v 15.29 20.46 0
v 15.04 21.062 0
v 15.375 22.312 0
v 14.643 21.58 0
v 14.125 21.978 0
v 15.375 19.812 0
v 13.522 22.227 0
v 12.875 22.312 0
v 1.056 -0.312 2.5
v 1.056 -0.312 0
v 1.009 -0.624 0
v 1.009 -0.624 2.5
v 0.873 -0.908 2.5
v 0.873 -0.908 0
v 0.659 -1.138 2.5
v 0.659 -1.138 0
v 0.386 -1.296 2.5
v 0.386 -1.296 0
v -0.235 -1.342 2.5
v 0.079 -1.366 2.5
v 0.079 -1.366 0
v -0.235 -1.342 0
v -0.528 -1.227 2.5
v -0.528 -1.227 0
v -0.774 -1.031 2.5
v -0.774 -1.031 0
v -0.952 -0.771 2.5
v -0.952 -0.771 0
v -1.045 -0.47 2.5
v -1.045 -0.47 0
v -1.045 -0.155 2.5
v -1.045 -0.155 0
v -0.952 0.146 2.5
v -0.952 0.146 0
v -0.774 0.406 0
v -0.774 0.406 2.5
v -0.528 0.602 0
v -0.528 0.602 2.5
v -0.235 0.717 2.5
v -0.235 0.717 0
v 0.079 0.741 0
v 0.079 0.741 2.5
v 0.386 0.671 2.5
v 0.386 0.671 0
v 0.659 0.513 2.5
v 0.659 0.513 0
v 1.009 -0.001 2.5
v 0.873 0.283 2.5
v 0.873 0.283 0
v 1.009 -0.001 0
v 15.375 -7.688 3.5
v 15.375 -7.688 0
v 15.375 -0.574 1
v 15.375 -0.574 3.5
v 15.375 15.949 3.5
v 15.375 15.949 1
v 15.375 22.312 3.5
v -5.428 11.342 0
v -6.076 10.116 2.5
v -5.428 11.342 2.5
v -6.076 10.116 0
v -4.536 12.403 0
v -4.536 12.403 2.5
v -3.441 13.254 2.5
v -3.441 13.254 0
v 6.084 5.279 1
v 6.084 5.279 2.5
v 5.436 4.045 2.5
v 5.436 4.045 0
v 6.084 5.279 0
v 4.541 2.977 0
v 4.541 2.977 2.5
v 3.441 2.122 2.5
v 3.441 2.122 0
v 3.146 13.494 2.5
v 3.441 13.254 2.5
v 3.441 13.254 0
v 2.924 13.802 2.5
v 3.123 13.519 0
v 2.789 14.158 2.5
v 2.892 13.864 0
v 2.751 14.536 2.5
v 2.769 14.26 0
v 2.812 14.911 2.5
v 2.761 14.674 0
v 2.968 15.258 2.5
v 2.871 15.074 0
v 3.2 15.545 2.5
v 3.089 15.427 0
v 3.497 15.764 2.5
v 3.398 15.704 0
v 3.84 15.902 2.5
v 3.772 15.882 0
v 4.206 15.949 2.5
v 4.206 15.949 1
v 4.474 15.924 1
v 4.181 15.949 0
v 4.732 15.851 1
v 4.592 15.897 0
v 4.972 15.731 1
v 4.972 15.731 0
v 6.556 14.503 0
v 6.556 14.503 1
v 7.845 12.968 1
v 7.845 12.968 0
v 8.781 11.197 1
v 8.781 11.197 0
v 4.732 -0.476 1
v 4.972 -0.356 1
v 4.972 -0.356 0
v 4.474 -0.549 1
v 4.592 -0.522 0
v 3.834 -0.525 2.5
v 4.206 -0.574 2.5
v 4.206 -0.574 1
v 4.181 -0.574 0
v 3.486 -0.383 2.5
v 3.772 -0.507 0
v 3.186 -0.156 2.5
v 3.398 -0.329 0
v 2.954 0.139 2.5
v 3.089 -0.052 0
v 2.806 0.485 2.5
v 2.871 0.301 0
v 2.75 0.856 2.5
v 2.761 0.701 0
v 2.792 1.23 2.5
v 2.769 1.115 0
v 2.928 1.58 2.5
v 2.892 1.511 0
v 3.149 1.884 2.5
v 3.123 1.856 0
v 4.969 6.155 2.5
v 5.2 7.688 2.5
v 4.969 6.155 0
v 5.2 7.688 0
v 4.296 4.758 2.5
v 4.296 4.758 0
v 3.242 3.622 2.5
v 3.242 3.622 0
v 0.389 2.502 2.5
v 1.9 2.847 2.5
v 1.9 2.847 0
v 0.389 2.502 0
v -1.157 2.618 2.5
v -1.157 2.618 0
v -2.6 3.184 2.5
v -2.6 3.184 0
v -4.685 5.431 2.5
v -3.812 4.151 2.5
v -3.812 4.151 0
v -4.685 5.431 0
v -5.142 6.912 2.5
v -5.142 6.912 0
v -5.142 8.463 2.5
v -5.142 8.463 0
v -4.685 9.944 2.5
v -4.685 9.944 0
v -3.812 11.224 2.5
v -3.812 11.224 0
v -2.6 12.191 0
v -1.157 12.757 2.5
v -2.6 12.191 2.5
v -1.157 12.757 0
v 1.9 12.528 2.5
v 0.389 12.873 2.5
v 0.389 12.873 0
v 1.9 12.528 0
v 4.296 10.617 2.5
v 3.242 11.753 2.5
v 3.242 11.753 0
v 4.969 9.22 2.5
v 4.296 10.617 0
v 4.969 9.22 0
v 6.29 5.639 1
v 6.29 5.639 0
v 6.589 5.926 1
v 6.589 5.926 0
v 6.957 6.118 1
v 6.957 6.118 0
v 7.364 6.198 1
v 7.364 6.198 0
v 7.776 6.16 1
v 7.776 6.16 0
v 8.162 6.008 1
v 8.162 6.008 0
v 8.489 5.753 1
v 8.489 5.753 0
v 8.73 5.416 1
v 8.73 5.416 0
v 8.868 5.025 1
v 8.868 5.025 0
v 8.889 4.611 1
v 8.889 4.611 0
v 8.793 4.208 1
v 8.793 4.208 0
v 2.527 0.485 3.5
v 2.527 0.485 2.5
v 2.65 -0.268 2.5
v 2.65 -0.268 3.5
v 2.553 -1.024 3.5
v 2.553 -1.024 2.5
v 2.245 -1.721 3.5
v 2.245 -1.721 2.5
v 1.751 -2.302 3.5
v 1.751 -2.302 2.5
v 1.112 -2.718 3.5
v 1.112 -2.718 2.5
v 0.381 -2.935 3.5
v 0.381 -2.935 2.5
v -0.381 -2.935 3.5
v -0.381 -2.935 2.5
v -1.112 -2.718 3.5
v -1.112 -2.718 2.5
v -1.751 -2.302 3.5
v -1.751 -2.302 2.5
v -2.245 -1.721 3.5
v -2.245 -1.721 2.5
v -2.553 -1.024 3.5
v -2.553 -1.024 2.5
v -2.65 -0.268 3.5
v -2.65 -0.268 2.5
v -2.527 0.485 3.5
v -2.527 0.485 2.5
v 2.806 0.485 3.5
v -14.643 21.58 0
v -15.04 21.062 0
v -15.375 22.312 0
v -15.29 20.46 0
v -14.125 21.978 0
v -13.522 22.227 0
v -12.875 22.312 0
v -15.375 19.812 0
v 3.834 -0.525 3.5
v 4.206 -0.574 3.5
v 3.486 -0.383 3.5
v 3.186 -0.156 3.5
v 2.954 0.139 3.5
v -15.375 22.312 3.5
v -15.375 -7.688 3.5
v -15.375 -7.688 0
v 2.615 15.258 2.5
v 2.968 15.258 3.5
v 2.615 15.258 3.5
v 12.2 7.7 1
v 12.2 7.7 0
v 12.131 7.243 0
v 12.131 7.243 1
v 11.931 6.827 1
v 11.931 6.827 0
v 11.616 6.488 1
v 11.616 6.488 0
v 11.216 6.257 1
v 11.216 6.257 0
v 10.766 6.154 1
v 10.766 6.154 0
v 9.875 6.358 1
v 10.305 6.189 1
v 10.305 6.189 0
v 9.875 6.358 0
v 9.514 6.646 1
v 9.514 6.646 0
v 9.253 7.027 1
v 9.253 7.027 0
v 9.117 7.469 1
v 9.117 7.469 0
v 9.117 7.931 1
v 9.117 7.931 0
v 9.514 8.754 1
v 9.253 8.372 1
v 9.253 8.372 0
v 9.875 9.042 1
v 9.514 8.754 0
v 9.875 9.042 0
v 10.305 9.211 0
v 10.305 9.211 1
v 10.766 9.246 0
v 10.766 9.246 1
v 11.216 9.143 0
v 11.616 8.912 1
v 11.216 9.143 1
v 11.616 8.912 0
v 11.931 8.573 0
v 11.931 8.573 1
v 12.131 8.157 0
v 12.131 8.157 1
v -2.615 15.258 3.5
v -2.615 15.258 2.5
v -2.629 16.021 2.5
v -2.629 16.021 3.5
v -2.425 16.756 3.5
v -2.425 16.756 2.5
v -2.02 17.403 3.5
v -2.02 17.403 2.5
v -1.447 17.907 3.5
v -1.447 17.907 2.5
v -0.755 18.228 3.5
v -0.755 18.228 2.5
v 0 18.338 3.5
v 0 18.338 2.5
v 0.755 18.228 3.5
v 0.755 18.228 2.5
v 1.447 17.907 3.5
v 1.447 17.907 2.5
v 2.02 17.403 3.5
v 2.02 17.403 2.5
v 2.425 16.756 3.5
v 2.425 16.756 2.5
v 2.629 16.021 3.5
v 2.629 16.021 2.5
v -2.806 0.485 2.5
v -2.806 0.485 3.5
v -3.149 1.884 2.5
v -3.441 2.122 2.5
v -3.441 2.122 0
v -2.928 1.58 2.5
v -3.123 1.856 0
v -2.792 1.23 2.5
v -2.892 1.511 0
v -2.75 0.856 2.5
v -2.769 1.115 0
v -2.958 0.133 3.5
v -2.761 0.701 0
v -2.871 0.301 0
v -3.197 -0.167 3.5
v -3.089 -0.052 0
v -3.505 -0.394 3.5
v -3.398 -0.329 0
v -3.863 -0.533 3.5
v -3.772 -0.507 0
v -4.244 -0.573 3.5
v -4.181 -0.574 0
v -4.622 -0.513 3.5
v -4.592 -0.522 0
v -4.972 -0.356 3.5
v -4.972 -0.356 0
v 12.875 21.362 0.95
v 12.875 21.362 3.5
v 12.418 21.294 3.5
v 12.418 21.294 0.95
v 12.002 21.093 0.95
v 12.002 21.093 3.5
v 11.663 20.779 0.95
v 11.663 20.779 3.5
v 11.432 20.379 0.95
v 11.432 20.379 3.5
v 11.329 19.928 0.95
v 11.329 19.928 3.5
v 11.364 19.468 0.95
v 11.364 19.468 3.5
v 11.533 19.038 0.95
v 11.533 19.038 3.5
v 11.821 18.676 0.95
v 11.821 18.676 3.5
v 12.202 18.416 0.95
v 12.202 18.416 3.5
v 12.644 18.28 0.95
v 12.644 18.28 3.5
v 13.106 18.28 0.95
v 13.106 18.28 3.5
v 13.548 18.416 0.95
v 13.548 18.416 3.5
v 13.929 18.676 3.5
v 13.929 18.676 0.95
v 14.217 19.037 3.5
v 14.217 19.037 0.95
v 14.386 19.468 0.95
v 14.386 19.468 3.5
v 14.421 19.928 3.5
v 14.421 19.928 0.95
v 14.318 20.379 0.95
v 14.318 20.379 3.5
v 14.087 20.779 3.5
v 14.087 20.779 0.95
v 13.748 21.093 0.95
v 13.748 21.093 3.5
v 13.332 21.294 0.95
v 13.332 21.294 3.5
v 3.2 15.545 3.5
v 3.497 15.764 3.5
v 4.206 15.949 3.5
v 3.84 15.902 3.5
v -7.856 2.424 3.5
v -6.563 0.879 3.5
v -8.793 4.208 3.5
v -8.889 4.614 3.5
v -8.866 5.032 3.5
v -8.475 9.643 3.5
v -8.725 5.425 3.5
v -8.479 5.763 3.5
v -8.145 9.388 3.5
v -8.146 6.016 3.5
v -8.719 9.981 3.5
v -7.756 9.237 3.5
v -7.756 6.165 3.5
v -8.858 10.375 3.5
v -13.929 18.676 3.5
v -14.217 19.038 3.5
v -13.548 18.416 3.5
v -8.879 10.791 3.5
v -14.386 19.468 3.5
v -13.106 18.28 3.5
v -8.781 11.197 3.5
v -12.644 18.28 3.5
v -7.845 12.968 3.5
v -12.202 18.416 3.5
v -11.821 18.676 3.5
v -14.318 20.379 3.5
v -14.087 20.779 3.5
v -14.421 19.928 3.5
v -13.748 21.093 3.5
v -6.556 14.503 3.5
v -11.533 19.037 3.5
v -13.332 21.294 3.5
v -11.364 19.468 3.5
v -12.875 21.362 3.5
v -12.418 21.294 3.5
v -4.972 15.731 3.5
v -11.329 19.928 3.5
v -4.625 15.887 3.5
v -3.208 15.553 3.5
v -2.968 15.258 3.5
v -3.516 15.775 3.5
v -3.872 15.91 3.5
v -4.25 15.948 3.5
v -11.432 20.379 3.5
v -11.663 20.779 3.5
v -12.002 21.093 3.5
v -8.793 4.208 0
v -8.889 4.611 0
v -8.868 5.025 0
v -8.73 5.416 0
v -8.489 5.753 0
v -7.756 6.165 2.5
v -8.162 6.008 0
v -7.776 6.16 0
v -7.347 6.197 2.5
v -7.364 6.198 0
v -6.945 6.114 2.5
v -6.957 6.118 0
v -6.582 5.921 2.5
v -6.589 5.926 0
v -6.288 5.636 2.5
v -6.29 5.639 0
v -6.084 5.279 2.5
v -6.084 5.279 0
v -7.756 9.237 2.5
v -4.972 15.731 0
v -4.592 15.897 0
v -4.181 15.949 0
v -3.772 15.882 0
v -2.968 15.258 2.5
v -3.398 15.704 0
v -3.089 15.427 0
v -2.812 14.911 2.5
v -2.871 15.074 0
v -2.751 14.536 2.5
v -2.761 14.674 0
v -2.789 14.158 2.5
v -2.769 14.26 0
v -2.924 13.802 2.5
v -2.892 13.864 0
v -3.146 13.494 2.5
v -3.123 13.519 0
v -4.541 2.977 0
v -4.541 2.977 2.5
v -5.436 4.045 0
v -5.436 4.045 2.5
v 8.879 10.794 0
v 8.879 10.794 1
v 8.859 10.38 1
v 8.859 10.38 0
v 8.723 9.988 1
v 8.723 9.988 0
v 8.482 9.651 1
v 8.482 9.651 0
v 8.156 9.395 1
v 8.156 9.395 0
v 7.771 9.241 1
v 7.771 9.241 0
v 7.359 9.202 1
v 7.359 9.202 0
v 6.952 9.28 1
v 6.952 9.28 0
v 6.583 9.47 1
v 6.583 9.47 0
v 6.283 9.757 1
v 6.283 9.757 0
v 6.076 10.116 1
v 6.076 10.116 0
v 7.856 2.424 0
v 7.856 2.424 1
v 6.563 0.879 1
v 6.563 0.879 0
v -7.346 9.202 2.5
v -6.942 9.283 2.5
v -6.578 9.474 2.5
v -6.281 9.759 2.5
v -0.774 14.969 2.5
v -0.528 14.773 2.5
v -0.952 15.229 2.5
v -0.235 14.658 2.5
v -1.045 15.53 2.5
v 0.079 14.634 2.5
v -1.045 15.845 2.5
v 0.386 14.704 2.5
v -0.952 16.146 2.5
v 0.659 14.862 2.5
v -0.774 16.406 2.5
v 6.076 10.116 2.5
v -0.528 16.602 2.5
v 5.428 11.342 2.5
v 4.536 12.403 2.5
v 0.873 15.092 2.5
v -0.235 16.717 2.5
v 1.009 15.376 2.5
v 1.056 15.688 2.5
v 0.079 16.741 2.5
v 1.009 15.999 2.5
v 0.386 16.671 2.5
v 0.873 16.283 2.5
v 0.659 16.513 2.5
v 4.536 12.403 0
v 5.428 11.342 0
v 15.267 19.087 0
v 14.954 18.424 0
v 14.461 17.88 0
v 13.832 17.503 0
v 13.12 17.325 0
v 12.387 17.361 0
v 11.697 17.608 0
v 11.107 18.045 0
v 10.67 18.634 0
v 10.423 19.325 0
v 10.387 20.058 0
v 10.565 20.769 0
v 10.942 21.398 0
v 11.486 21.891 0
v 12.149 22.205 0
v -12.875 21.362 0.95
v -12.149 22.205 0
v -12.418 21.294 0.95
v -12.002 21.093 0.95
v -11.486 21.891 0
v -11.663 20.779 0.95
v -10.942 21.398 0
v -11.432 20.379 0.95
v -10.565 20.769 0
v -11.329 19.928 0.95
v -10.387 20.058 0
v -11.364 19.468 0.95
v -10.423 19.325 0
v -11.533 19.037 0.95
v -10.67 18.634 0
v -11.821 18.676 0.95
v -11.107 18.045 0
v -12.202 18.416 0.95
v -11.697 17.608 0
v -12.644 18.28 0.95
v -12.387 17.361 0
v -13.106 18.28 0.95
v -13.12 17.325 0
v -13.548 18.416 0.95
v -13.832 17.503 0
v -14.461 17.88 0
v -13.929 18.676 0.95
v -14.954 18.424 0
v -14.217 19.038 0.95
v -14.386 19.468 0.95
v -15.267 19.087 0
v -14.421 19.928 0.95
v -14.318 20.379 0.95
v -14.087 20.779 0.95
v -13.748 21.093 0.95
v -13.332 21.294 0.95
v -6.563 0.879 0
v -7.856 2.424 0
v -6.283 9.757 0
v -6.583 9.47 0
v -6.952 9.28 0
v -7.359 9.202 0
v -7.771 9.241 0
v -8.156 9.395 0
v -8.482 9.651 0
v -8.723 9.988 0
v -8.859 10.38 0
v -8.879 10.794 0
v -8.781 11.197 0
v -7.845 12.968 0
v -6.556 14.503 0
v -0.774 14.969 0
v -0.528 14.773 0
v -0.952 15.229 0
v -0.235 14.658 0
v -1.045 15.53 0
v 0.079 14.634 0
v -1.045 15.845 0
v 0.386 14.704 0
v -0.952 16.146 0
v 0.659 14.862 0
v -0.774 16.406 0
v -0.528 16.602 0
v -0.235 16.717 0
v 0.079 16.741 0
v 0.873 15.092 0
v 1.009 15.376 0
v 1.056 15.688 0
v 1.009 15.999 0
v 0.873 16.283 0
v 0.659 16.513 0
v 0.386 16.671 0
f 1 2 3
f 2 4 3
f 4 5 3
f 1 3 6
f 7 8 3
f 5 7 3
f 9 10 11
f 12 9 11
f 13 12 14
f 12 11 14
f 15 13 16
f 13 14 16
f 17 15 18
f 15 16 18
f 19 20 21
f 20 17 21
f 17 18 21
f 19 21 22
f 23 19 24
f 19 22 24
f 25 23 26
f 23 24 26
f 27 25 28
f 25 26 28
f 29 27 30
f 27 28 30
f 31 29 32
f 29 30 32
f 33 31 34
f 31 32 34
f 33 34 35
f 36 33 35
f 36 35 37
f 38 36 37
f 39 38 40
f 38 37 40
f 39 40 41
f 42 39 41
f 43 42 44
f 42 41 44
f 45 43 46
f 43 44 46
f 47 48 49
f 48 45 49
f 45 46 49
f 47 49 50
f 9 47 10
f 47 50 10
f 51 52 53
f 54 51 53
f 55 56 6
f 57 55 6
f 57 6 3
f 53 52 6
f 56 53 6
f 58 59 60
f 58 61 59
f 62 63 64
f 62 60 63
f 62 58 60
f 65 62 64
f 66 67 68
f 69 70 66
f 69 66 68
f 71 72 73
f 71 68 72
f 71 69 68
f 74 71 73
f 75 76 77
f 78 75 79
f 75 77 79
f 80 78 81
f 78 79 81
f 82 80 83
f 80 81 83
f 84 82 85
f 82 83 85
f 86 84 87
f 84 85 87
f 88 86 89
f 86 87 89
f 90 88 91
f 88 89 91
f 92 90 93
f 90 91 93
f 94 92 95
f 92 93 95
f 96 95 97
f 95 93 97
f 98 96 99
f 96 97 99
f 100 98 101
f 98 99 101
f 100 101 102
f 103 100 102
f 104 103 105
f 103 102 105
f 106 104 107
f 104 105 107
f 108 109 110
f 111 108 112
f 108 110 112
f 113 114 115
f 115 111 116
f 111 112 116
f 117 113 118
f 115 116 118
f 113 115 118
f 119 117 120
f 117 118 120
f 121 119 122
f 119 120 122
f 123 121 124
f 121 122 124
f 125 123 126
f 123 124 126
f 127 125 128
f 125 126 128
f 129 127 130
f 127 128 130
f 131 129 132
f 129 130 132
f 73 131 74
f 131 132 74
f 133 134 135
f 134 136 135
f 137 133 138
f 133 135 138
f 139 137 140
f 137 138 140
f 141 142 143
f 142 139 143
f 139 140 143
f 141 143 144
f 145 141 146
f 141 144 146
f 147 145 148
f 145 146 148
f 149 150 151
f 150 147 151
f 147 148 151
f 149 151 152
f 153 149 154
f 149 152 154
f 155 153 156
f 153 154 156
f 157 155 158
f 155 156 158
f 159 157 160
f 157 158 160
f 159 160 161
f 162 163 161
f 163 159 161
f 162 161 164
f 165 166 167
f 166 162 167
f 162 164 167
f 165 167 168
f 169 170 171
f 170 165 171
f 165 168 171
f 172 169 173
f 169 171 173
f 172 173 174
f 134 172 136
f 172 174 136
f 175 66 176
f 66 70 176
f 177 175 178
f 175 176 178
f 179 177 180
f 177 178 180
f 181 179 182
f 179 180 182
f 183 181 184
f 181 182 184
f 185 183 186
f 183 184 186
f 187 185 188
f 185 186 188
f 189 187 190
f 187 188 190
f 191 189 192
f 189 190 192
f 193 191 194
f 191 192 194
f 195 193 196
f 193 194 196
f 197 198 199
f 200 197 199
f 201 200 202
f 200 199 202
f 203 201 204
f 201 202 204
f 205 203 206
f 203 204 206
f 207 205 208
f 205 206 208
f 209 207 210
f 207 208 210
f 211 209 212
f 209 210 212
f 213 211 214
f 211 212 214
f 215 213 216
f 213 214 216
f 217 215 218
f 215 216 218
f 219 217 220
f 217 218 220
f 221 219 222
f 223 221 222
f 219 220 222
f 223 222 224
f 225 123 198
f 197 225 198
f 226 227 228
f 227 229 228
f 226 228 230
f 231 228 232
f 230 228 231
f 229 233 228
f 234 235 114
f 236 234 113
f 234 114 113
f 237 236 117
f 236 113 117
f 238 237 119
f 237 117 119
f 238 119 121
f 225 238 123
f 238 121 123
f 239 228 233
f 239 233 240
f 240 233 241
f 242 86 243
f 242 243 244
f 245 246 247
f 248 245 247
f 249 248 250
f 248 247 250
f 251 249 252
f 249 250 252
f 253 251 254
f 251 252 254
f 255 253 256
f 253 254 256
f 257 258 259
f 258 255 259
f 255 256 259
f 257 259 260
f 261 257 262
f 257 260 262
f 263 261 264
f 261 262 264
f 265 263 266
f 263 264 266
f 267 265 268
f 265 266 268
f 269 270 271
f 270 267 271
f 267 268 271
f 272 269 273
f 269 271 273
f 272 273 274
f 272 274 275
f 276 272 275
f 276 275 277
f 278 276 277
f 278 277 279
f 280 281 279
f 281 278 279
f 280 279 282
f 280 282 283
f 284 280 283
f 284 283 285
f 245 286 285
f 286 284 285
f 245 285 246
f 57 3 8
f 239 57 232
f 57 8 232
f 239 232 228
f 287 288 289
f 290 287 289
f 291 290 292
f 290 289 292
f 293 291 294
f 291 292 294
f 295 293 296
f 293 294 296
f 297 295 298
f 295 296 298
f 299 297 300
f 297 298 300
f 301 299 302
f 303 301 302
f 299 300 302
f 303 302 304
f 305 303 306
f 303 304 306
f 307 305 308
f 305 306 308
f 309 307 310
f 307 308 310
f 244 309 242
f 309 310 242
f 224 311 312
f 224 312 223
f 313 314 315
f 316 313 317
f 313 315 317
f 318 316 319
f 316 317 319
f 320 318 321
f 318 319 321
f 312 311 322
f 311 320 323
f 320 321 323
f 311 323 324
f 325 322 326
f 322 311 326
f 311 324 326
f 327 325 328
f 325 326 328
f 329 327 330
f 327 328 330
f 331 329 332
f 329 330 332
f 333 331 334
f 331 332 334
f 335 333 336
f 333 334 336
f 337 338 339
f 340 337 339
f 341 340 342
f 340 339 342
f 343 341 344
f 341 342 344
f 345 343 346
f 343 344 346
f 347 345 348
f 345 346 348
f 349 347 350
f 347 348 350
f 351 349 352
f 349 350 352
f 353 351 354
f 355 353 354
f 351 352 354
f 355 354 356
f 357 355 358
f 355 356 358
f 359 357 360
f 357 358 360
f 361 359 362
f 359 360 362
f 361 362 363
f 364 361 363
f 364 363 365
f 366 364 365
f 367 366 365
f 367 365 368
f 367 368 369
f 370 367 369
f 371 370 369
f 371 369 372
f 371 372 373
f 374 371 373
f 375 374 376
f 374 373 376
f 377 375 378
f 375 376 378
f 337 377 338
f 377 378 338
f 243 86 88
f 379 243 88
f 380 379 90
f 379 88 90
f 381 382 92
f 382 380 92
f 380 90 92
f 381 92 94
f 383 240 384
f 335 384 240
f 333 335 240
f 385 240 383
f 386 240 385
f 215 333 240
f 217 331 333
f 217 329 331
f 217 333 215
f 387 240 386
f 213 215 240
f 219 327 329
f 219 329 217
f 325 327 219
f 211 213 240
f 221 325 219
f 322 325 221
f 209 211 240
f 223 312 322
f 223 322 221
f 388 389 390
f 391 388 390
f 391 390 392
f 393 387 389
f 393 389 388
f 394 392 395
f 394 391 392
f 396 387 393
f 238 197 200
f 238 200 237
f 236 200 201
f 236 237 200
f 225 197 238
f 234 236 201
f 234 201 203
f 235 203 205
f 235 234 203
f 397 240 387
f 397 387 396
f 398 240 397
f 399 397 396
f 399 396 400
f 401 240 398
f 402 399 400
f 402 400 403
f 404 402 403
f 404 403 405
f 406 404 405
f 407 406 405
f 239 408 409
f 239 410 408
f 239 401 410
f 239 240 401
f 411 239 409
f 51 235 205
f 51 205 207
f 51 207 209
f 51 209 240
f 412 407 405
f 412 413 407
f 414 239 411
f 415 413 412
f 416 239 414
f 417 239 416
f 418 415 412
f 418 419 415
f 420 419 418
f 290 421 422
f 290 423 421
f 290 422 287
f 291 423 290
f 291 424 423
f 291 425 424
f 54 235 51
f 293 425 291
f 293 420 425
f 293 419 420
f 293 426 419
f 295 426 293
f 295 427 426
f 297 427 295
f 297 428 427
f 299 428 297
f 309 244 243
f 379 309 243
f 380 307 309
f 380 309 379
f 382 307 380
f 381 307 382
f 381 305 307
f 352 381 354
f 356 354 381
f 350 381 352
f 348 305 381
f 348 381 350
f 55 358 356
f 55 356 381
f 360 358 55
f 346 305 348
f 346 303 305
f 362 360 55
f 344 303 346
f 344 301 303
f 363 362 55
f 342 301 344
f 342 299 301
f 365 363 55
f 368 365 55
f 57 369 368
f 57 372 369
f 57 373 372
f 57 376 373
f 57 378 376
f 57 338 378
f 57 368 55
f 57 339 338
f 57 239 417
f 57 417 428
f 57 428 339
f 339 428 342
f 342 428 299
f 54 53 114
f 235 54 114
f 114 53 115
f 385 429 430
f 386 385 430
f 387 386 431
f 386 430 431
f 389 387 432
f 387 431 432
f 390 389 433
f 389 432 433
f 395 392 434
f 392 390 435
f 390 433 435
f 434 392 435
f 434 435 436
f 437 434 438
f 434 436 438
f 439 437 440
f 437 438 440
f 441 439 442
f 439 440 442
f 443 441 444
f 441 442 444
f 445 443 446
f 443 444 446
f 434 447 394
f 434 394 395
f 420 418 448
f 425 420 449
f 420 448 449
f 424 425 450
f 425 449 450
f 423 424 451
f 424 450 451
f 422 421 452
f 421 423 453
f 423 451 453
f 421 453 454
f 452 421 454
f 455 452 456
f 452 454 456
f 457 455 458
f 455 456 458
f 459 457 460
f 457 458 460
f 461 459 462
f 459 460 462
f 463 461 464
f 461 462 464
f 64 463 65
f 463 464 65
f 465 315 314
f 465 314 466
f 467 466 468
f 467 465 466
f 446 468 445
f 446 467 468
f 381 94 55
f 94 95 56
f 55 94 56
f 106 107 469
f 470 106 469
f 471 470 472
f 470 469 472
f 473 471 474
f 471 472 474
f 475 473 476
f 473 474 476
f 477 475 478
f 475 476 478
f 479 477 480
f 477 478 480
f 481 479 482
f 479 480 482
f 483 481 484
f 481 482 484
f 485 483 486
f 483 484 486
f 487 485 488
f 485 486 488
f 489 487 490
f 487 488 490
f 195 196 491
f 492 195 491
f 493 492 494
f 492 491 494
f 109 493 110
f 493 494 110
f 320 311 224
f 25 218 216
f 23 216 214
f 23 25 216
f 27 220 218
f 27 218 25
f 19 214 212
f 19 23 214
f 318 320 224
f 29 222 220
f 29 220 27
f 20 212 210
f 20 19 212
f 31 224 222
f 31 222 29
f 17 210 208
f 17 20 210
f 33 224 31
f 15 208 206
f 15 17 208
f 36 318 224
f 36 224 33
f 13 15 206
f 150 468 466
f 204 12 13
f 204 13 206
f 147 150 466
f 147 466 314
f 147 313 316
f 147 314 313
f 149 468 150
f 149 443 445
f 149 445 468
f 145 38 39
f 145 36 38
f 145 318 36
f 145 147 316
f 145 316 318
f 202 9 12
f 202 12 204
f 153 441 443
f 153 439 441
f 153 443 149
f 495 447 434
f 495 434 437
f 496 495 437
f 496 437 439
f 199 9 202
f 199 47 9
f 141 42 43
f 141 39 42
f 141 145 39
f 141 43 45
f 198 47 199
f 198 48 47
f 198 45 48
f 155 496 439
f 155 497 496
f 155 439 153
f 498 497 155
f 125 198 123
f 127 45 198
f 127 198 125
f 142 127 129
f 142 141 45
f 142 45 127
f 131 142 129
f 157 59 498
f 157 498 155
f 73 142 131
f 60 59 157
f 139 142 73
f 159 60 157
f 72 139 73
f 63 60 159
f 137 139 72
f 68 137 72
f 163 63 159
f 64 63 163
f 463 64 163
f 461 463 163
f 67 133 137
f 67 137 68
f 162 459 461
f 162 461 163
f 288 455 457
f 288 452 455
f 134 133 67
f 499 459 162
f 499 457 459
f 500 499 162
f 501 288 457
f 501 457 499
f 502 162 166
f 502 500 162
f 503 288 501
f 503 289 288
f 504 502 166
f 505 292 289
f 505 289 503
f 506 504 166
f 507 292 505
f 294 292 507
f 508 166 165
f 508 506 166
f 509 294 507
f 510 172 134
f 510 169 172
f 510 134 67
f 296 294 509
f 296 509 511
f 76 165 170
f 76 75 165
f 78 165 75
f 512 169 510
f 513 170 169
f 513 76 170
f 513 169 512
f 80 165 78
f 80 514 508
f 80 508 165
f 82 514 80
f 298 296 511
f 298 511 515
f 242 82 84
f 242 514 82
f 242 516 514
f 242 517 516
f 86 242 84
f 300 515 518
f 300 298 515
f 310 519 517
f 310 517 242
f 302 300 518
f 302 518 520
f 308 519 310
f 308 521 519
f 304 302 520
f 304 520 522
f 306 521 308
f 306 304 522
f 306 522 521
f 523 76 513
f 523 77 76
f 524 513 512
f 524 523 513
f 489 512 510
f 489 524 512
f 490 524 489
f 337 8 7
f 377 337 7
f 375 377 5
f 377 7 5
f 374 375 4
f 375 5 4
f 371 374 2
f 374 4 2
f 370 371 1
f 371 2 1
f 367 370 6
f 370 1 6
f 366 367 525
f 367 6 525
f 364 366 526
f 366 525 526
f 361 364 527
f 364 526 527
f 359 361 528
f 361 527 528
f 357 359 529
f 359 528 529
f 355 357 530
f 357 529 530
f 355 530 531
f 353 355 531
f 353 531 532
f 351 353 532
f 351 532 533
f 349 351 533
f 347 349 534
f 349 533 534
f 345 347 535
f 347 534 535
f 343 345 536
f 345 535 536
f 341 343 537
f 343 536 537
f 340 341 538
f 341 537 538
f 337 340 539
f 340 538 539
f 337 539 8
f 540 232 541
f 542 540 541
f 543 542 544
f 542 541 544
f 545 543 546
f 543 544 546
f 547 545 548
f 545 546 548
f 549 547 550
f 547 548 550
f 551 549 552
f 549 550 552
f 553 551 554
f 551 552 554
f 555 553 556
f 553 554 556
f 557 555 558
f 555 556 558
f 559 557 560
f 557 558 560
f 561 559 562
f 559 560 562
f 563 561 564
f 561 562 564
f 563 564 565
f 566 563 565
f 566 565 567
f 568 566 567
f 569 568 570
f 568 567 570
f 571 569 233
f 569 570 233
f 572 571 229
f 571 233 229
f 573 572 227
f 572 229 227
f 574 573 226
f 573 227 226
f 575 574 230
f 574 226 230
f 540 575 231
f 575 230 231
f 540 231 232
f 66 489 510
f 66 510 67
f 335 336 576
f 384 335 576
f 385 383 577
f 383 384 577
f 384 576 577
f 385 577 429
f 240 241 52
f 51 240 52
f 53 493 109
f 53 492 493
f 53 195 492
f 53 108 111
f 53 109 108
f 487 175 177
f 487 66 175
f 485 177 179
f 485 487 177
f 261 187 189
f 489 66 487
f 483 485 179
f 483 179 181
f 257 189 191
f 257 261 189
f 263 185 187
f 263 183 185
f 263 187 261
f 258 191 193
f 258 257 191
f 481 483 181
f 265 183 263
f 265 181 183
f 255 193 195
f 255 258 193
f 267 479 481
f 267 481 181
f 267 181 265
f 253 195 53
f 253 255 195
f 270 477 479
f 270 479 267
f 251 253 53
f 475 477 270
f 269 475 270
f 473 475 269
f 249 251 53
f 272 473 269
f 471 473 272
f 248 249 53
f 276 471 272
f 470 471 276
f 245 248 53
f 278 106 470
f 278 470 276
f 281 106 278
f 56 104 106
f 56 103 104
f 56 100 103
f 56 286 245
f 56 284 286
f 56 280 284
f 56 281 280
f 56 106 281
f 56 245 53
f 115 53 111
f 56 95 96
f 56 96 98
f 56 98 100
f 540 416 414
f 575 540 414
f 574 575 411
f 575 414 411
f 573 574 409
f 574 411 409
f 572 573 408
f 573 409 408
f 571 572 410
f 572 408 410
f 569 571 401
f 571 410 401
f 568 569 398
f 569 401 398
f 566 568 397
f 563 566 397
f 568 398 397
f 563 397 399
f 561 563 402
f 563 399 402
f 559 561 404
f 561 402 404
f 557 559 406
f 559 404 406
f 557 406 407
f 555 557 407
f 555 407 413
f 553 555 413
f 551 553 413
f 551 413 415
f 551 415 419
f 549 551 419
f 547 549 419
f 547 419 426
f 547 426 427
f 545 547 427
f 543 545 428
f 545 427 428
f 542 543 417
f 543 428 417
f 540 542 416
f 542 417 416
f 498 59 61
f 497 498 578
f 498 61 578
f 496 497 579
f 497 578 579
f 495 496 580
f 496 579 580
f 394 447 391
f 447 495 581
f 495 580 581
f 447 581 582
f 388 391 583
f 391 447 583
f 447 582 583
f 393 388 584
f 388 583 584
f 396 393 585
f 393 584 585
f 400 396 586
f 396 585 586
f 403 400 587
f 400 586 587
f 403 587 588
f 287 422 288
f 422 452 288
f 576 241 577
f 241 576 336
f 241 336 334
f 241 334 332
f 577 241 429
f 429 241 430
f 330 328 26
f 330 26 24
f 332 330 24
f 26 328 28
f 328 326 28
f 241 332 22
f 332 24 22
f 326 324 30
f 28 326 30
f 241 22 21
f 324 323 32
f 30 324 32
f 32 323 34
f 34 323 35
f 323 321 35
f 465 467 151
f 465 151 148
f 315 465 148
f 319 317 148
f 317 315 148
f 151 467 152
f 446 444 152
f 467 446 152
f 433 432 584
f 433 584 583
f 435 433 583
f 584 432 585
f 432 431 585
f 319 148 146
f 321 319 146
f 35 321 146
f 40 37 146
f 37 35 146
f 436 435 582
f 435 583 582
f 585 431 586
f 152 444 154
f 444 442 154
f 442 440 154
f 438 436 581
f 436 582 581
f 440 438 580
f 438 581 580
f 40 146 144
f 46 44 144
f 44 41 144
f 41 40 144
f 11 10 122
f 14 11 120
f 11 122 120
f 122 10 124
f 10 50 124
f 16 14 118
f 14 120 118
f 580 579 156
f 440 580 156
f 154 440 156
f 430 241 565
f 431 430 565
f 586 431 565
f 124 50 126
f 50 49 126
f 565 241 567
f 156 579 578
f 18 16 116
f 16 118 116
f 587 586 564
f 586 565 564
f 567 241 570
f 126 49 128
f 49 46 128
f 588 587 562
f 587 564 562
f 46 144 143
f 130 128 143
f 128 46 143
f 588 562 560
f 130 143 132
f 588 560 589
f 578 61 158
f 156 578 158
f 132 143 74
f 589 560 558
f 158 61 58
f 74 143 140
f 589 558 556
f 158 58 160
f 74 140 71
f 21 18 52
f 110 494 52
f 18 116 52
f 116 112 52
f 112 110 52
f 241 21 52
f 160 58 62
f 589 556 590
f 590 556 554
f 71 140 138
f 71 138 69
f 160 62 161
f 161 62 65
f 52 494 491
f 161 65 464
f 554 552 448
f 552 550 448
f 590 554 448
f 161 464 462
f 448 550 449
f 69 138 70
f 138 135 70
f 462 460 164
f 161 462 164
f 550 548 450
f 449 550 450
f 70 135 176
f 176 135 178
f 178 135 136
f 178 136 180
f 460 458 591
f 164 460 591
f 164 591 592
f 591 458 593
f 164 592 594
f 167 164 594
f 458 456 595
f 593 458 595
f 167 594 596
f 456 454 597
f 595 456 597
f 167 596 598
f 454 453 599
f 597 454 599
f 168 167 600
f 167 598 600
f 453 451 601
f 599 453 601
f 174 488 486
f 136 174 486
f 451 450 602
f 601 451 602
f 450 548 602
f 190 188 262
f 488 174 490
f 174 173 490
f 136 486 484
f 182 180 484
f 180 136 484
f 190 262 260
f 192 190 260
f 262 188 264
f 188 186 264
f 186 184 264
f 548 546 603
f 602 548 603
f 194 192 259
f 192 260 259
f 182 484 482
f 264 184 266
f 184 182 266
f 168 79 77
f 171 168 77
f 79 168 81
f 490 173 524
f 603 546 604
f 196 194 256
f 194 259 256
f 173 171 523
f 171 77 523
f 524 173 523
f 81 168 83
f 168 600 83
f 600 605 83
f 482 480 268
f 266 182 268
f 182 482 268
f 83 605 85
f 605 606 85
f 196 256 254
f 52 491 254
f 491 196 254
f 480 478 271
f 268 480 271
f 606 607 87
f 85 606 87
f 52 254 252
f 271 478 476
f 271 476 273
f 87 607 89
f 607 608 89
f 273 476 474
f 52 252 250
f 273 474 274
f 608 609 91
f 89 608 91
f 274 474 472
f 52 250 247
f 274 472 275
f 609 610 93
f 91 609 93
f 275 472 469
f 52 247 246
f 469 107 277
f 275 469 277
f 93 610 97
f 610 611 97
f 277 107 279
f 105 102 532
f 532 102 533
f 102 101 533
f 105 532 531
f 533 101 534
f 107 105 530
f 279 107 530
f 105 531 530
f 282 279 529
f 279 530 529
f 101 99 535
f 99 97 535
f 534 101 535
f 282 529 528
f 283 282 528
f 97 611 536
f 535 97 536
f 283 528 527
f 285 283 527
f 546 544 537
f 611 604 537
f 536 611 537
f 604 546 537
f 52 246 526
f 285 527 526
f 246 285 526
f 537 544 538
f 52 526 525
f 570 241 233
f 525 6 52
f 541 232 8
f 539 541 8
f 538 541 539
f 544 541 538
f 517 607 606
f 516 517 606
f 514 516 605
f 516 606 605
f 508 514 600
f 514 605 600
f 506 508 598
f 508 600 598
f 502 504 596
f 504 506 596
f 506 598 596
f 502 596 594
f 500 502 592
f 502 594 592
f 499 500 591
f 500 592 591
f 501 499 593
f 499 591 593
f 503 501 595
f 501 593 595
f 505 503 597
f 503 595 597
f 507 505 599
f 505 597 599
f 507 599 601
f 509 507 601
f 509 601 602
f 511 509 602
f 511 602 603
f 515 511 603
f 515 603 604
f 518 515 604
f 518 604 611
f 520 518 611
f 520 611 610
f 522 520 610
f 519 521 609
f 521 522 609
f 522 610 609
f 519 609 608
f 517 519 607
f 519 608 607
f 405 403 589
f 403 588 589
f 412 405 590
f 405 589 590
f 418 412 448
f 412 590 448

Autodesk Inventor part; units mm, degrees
ref_plane "YZ Plane" through (0, 0, 0) normal (1, 0, 0) x (0, 1, 0)
ref_plane "XZ Plane" through (0, 0, 0) normal (0, 1, 0) x (-1, 0, 0)
ref_plane "XY Plane" through (0, 0, 0) normal (0, 0, 1) x (1, 0, 0)
ref_plane "Work Plane1" through (0, 0, 0) normal (0, 0, 1) x (1, 0, 0)
sketch "Sketch1" plane through (0, 0, 0) normal (0, 0, 1) x (1, 0, 0)
  arc A0 (-3.651, 13.5937) -> (-4.7619, 15.391) centre (-4.2064, 14.4923) ccw projected
  arc A1 (-3.651, 13.5937) -> (-6.4477, 10.2643) centre (0, 7.6875) ccw projected
  arc A2 (-8.4097, 11.0483) -> (-6.4477, 10.2643) centre (-7.4287, 10.6563) ccw projected
  arc A3 (-4.7619, 15.391) -> (-8.4097, 11.0483) centre (0, 7.6875) ccw projected
  arc A4 (6.4477, 10.2643) -> (8.4097, 11.0483) centre (7.4287, 10.6563) ccw projected
  arc A5 (6.4477, 10.2643) -> (3.651, 13.5937) centre (0, 7.6875) ccw projected
  arc A6 (4.7619, 15.391) -> (3.651, 13.5937) centre (4.2064, 14.4923) ccw projected
  arc A7 (8.4097, 11.0483) -> (4.7619, 15.391) centre (0, 7.6875) ccw projected
  arc A8 (-6.4563, 5.1322) -> (-8.4209, 4.3547) centre (-7.4386, 4.7434) ccw projected
  arc A9 (-6.4563, 5.1322) -> (-3.651, 1.7813) centre (0, 7.6875) ccw projected
  arc A10 (-4.7619, -0.016) -> (-3.651, 1.7813) centre (-4.2064, 0.8827) ccw projected
  arc A11 (-8.4209, 4.3547) -> (-4.7619, -0.016) centre (0, 7.6875) ccw projected
  arc A12 (3.651, 1.7813) -> (4.7619, -0.016) centre (4.2064, 0.8827) ccw projected
  arc A13 (3.651, 1.7813) -> (6.4563, 5.1322) centre (0, 7.6875) ccw projected
  arc A14 (8.4209, 4.3547) -> (6.4563, 5.1322) centre (7.4386, 4.7434) ccw projected
  arc A15 (4.7619, -0.016) -> (8.4209, 4.3547) centre (0, 7.6875) ccw projected
  circle A16 centre (10.65, 7.6999) radius 1.15 projected
  circle A17 centre (0, 15.6875) radius 1.0564 projected
  circle A18 centre (0, -0.3125) radius 1.0564 projected
  circle A19 centre (0, 7.6875) radius 5 projected
  circle A20 centre (0, 7.6875) radius 13.7 projected
  line L0 (-116.625, -11.1875) -> (15.375, -11.1875) projected
  line L1 (15.375, -11.1875) -> (15.375, -7.6875) projected
  line L2 (-116.625, -7.6875) -> (15.375, -7.6875) projected
  line L3 (-116.625, -11.1875) -> (-116.625, -7.6875) projected
  line L4 (15.375, -7.6875) -> (-15.375, -7.6875)
  line L5 (-15.375, -7.6875) -> (-15.375, 22.3125)
  line L6 (-15.375, 22.3125) -> (15.375, 22.3125)
  line L7 (15.375, 22.3125) -> (15.375, -7.6875)
  circle A21 centre (0, 7.6875) radius 14.375 projected
  circle A22 centre (0, 7.6875) radius 5.2
  arc A23 (-3.4406, 13.2535) -> (-4.9722, 15.7312) centre (-4.2064, 14.4923) ccw
  arc A24 (-3.4406, 13.2535) -> (-6.0763, 10.1158) centre (0, 7.6875) ccw
  arc A25 (-8.7812, 11.1968) -> (-6.0763, 10.1158) centre (-7.4287, 10.6563) ccw
  arc A26 (-4.9722, 15.7312) -> (-8.7812, 11.1968) centre (0, 7.6875) ccw
  arc A27 (4.9722, 15.7312) -> (3.4406, 13.2535) centre (4.2064, 14.4923) ccw
  arc A28 (6.0763, 10.1158) -> (3.4406, 13.2535) centre (0, 7.6875) ccw
  arc A29 (6.0763, 10.1158) -> (8.7812, 11.1968) centre (7.4287, 10.6563) ccw
  arc A30 (8.7812, 11.1968) -> (4.9722, 15.7312) centre (0, 7.6875) ccw
  arc A31 (3.4406, 2.1215) -> (6.0844, 5.2794) centre (0, 7.6875) ccw
  arc A32 (3.4406, 2.1215) -> (4.9722, -0.3562) centre (4.2064, 0.8827) ccw
  arc A33 (4.9722, -0.3562) -> (8.7928, 4.2075) centre (0, 7.6875) ccw
  arc A34 (8.7928, 4.2075) -> (6.0844, 5.2794) centre (7.4386, 4.7434) ccw
  arc A35 (-6.0844, 5.2794) -> (-8.7928, 4.2075) centre (-7.4386, 4.7434) ccw
  arc A36 (-6.0844, 5.2794) -> (-3.4406, 2.1215) centre (0, 7.6875) ccw
  arc A37 (-4.9722, -0.3562) -> (-3.4406, 2.1215) centre (-4.2064, 0.8827) ccw
  arc A38 (-8.7928, 4.2075) -> (-4.9722, -0.3562) centre (0, 7.6875) ccw
  circle A39 centre (10.65, 7.6999) radius 1.55
  point P0 (0, 0)
  dimension "d0" = 30
  dimension "d1" = 15.375
  dimension "d2" = 15.375
  dimension "d3" = 0.2
  dimension "d4" = 0.4
  dimension "d5" = 0.4
  dimension "d6" = 0.4
  dimension "d7" = 0.4
  dimension "d8" = 0.4
extrude "Extrusion1" add sketch "Sketch1" along normal blind 1 contours A20 | L2 L5 L6 L7 | A21
sketch "Sketch2" plane through (0, 0, 1) normal (0, 0, 1) x (1, 0, 0)
  line L0 (15.375, 22.3125) -> (-15.375, 22.3125) projected
  line L1 (-15.375, 22.3125) -> (-15.375, -7.6875) projected
  line L2 (-15.375, -7.6875) -> (15.375, -7.6875) projected
  line L3 (15.375, -7.6875) -> (15.375, 22.3125) projected
  circle A0 centre (0, 15.6875) radius 1.0564 projected
  circle A1 centre (0, -0.3125) radius 1.0564 projected
  circle A2 centre (0, 7.6875) radius 5.2 projected
  arc A3 (-3.4406, 13.2535) -> (-6.0763, 10.1158) centre (0, 7.6875) ccw projected
  arc A4 (-8.7812, 11.1968) -> (-6.0763, 10.1158) centre (-7.4287, 10.6563) ccw projected
  arc A5 (-4.9722, 15.7312) -> (-8.7812, 11.1968) centre (0, 7.6875) ccw projected
  arc A6 (-3.4406, 13.2535) -> (-4.9722, 15.7312) centre (-4.2064, 14.4923) ccw projected
  arc A7 (6.0763, 10.1158) -> (3.4406, 13.2535) centre (0, 7.6875) ccw projected
  arc A8 (4.9722, 15.7312) -> (3.4406, 13.2535) centre (4.2064, 14.4923) ccw projected
  arc A9 (8.7812, 11.1968) -> (4.9722, 15.7312) centre (0, 7.6875) ccw projected
  arc A10 (6.0763, 10.1158) -> (8.7812, 11.1968) centre (7.4287, 10.6563) ccw projected
  arc A11 (3.4406, 2.1215) -> (4.9722, -0.3562) centre (4.2064, 0.8827) ccw projected
  arc A12 (3.4406, 2.1215) -> (6.0844, 5.2794) centre (0, 7.6875) ccw projected
  arc A13 (8.7928, 4.2075) -> (6.0844, 5.2794) centre (7.4386, 4.7434) ccw projected
  arc A14 (4.9722, -0.3562) -> (8.7928, 4.2075) centre (0, 7.6875) ccw projected
  arc A15 (-6.0844, 5.2794) -> (-3.4406, 2.1215) centre (0, 7.6875) ccw projected
  arc A16 (-4.9722, -0.3562) -> (-3.4406, 2.1215) centre (-4.2064, 0.8827) ccw projected
  arc A17 (-8.7928, 4.2075) -> (-4.9722, -0.3562) centre (0, 7.6875) ccw projected
  arc A18 (-6.0844, 5.2794) -> (-8.7928, 4.2075) centre (-7.4386, 4.7434) ccw projected
  circle A19 centre (10.65, 7.6999) radius 1.55 projected
  arc A20 (4.9722, 15.7312) -> (3.4406, 13.2535) centre (4.2064, 14.4923) ccw projected
  line L4 (4.2064, 15.9488) -> (15.375, 15.9488)
  line L5 (15.375, -7.6875) -> (15.375, 22.3125) projected
  line L6 (4.2064, -0.5738) -> (15.375, -0.5738)
  arc A21 (6.0763, 10.1158) -> (8.7812, 11.1968) centre (7.4287, 10.6563) ccw projected
  line L7 (6.0763, 10.1158) -> (6.0844, 5.2794)
  point P0 (0, 0)
extrude "Extrusion2" add sketch "Sketch2" along normal blind 1.5 contours L3 L4 A8 A7 L7 A12 A11 L6 L2 L1 L0
sketch "Sketch3" plane through (0, 0, 2.5) normal (0, 0, 1) x (1, 0, 0)
  line L0 (15.375, -7.6875) -> (15.375, -0.5738) projected
  line L1 (15.375, -0.5738) -> (4.2064, -0.5738) projected
  arc A0 (3.4406, 2.1215) -> (4.2064, -0.5738) centre (4.2064, 0.8827) ccw projected
  arc A1 (3.4406, 2.1215) -> (6.0844, 5.2794) centre (0, 7.6875) ccw projected
  line L2 (6.0844, 5.2794) -> (6.0763, 10.1158) projected
  arc A2 (6.0763, 10.1158) -> (3.4406, 13.2535) centre (0, 7.6875) ccw projected
  arc A3 (4.2064, 15.9488) -> (3.4406, 13.2535) centre (4.2064, 14.4923) ccw projected
  line L3 (4.2064, 15.9488) -> (15.375, 15.9488) projected
  line L4 (15.375, 15.9488) -> (15.375, 22.3125) projected
  line L5 (15.375, 22.3125) -> (-15.375, 22.3125) projected
  line L6 (-15.375, 22.3125) -> (-15.375, -7.6875) projected
  line L7 (-15.375, -7.6875) -> (15.375, -7.6875) projected
  circle A4 centre (0, 15.6875) radius 1.0564 projected
  circle A5 centre (0, -0.3125) radius 1.0564 projected
  arc A6 (-6.0844, 5.2794) -> (-8.7928, 4.2075) centre (-7.4386, 4.7434) ccw projected
  arc A7 (-6.0844, 5.2794) -> (-3.4406, 2.1215) centre (0, 7.6875) ccw projected
  arc A8 (-4.9722, -0.3562) -> (-3.4406, 2.1215) centre (-4.2064, 0.8827) ccw projected
  arc A9 (-8.7928, 4.2075) -> (-4.9722, -0.3562) centre (0, 7.6875) ccw projected
  arc A10 (-3.4406, 13.2535) -> (-4.9722, 15.7312) centre (-4.2064, 14.4923) ccw projected
  arc A11 (-3.4406, 13.2535) -> (-6.0763, 10.1158) centre (0, 7.6875) ccw projected
  arc A12 (-8.7812, 11.1968) -> (-6.0763, 10.1158) centre (-7.4287, 10.6563) ccw projected
  arc A13 (-4.9722, 15.7312) -> (-8.7812, 11.1968) centre (0, 7.6875) ccw projected
  circle A14 centre (0, 7.6875) radius 5.2 projected
  circle A15 centre (0, 15.6875) radius 2.65
  circle A16 centre (0, -0.3125) radius 1.0564 projected
  circle A17 centre (0, -0.3125) radius 2.65
  arc A18 (-2.4425, 10.6818) -> (-4.3563, 11.5819) centre (-5.3868, 6.906) ccw projected
  arc A19 (-4.3563, 11.5819) -> (-4.9119, 10.8525) centre (0, 7.6875) ccw projected
  arc A20 (-4.9119, 10.8525) -> (-3.5356, 9.2466) centre (-0.678, 13.0883) ccw projected
  arc A21 (-3.5356, 9.2466) -> (-3.736, 8.6743) centre (0, 7.6875) ccw projected
  arc A22 (-3.736, 8.6743) -> (-5.8134, 8.2775) centre (-3.8987, 3.889) ccw projected
  arc A23 (-5.8134, 8.2775) -> (-5.8341, 7.3609) centre (0, 7.6875) ccw projected
  arc A24 (-5.8341, 7.3609) -> (-3.7768, 6.8706) centre (-3.723, 11.6584) ccw projected
  arc A25 (-3.7768, 6.8706) -> (-3.6025, 6.2899) centre (0, 7.6875) ccw projected
  arc A26 (-3.6025, 6.2899) -> (-5.05, 4.7478) centre (-0.9214, 2.3228) ccw projected
  arc A27 (-5.05, 4.7478) -> (-4.5279, 3.994) centre (0, 7.6875) ccw projected
  arc A28 (-4.5279, 3.994) -> (-2.5753, 4.8067) centre (-5.346, 8.7117) ccw projected
  arc A29 (-2.5753, 4.8067) -> (-2.093, 4.4393) centre (0, 7.6875) ccw projected
  arc A30 (-2.093, 4.4393) -> (-2.3576, 2.341) centre (2.4078, 2.8058) ccw projected
  arc A31 (-2.3576, 2.341) -> (-1.4922, 2.038) centre (0, 7.6875) ccw projected
  arc A32 (-1.4922, 2.038) -> (-0.3902, 3.8431) centre (-4.927, 5.3738) ccw projected
  arc A33 (-0.3902, 3.8431) -> (0.216, 3.8294) centre (0, 7.6875) ccw projected
  arc A34 (0.216, 3.8294) -> (1.2353, 1.9763) centre (4.8174, 5.1534) ccw projected
  arc A35 (1.2353, 1.9763) -> (2.1135, 2.2398) centre (0, 7.6875) ccw projected
  arc A36 (2.1135, 2.2398) -> (1.944, 4.348) centre (-2.6261, 2.9196) ccw projected
  arc A37 (1.944, 4.348) -> (2.4425, 4.6932) centre (0, 7.6875) ccw projected
  arc A38 (2.4425, 4.6932) -> (4.3563, 3.7931) centre (5.3868, 8.469) ccw projected
  arc A39 (4.3563, 3.7931) -> (4.9119, 4.5225) centre (0, 7.6875) ccw projected
  arc A40 (4.9119, 4.5225) -> (3.5356, 6.1284) centre (0.678, 2.2867) ccw projected
  arc A41 (3.5356, 6.1284) -> (3.736, 6.7007) centre (0, 7.6875) ccw projected
  arc A42 (3.736, 6.7007) -> (5.8134, 7.0975) centre (3.8987, 11.486) ccw projected
  arc A43 (5.8134, 7.0975) -> (5.8341, 8.0141) centre (0, 7.6875) ccw projected
  arc A44 (5.8341, 8.0141) -> (3.7768, 8.5044) centre (3.723, 3.7166) ccw projected
  arc A45 (3.7768, 8.5044) -> (3.6025, 9.0851) centre (0, 7.6875) ccw projected
  arc A46 (3.6025, 9.0851) -> (5.05, 10.6272) centre (0.9214, 13.0522) ccw projected
  arc A47 (5.05, 10.6272) -> (4.5279, 11.381) centre (0, 7.6875) ccw projected
  arc A48 (4.5279, 11.381) -> (2.5753, 10.5683) centre (5.346, 6.6633) ccw projected
  arc A49 (2.5753, 10.5683) -> (2.093, 10.9357) centre (0, 7.6875) ccw projected
  arc A50 (2.093, 10.9357) -> (2.3576, 13.034) centre (-2.4078, 12.5692) ccw projected
  arc A51 (2.3576, 13.034) -> (1.4922, 13.337) centre (0, 7.6875) ccw projected
  arc A52 (1.4922, 13.337) -> (0.3902, 11.5319) centre (4.927, 10.0012) ccw projected
  arc A53 (0.3902, 11.5319) -> (-0.216, 11.5456) centre (0, 7.6875) ccw projected
  arc A54 (-0.216, 11.5456) -> (-1.2353, 13.3987) centre (-4.8174, 10.2216) ccw projected
  arc A55 (-1.2353, 13.3987) -> (-2.1135, 13.1352) centre (0, 7.6875) ccw projected
  arc A56 (-2.1135, 13.1352) -> (-1.944, 11.027) centre (2.6261, 12.4554) ccw projected
  arc A57 (-1.944, 11.027) -> (-2.4425, 10.6818) centre (0, 7.6875) ccw projected
  circle A58 centre (0, 7.6875) radius 5.8433
  circle A59 centre (0, 7.6875) radius 6.5436
  arc A60 (-3.4406, 13.2535) -> (-4.9722, 15.7312) centre (-4.2064, 14.4923) ccw projected
  line L8 (-2.9676, 15.2581) -> (-2.615, 15.2581)
  arc A61 (4.9722, 15.7312) -> (3.4406, 13.2535) centre (4.2064, 14.4923) ccw projected
  line L9 (2.9676, 15.2581) -> (2.615, 15.2581)
  arc A62 (3.4406, 2.1215) -> (4.9722, -0.3562) centre (4.2064, 0.8827) ccw projected
  line L10 (2.8055, 0.4846) -> (2.5273, 0.4846)
  arc A63 (-4.9722, -0.3562) -> (-3.4406, 2.1215) centre (-4.2064, 0.8827) ccw projected
  line L11 (-2.8055, 0.4846) -> (-2.5273, 0.4846)
  arc A64 (-8.7812, 11.1968) -> (-6.0763, 10.1158) centre (-7.4287, 10.6563) ccw projected
  line L12 (-7.7556, 9.237) -> (-7.7556, 6.165)
  point P0 (0, 0)
  point P1 (-6.0844, 5.2794)
  point P2 (-6.0763, 10.1158)
  point P3 (2.9676, 15.2581)
  dimension "d13" = 5.3
  dimension "d14" = 5.3
extrude "Extrusion3" add sketch "Sketch3" along normal blind 1 contours L7 L6 L5 L4 L3 A3 L9 A15 L8 A10 A13 A12 L12 A6 A9 A8 L11 A17 L10 A0 L1 L0
sketch "Sketch5" plane through (0, 0, 0) normal (0, 0, -1) x (-1, 0, 0)
  line L0 (-15.375, 22.3125) -> (15.375, 22.3125) projected
  line L1 (-15.375, -7.6875) -> (-15.375, 22.3125) projected
  line L2 (15.375, -7.6875) -> (-15.375, -7.6875) projected
  line L3 (15.375, 22.3125) -> (15.375, -7.6875) projected
  circle A0 centre (0, 15.6875) radius 1.0564 projected
  circle A1 centre (0, -0.3125) radius 1.0564 projected
  circle A2 centre (0, 7.6875) radius 5.2 projected
  arc A3 (6.0763, 10.1158) -> (3.4406, 13.2535) centre (0, 7.6875) ccw projected
  arc A4 (4.9722, 15.7312) -> (3.4406, 13.2535) centre (4.2064, 14.4923) ccw projected
  arc A5 (8.7812, 11.1968) -> (4.9722, 15.7312) centre (0, 7.6875) ccw projected
  arc A6 (6.0763, 10.1158) -> (8.7812, 11.1968) centre (7.4287, 10.6563) ccw projected
  arc A7 (-3.4406, 13.2535) -> (-6.0763, 10.1158) centre (0, 7.6875) ccw projected
  arc A8 (-8.7812, 11.1968) -> (-6.0763, 10.1158) centre (-7.4287, 10.6563) ccw projected
  arc A9 (-4.9722, 15.7312) -> (-8.7812, 11.1968) centre (0, 7.6875) ccw projected
  arc A10 (-3.4406, 13.2535) -> (-4.9722, 15.7312) centre (-4.2064, 14.4923) ccw projected
  arc A11 (-4.9722, -0.3562) -> (-3.4406, 2.1215) centre (-4.2064, 0.8827) ccw projected
  arc A12 (-8.7928, 4.2075) -> (-4.9722, -0.3562) centre (0, 7.6875) ccw projected
  arc A13 (-6.0844, 5.2794) -> (-8.7928, 4.2075) centre (-7.4386, 4.7434) ccw projected
  arc A14 (-6.0844, 5.2794) -> (-3.4406, 2.1215) centre (0, 7.6875) ccw projected
  arc A15 (3.4406, 2.1215) -> (6.0844, 5.2794) centre (0, 7.6875) ccw projected
  arc A16 (8.7928, 4.2075) -> (6.0844, 5.2794) centre (7.4386, 4.7434) ccw projected
  arc A17 (4.9722, -0.3562) -> (8.7928, 4.2075) centre (0, 7.6875) ccw projected
  arc A18 (3.4406, 2.1215) -> (4.9722, -0.3562) centre (4.2064, 0.8827) ccw projected
  circle A19 centre (-10.65, 7.6999) radius 1.55 projected
  circle A20 centre (-12.875, 19.8125) radius 2.5
  circle A21 centre (12.875, 19.8125) radius 2.5
  point P0 (0, 0)
  dimension "d26" = 5
  dimension "d27" = 5
  dimension "d28" = 2.5
  dimension "d29" = 2.5
  dimension "d30" = 2.5
  dimension "d31" = 2.5
hole "Hole2" at (12.875, 19.8125, 0) at (-12.875, 19.8125, 0) direction (0, 0, 1) diameter 3.1 end through all countersink diameter 5 countersink angle 90 clearance for "Countersunk Flat Head Screw ISO 2009/7046" size "M2.5" standard "ISO"
equation "\"d2\" = d1"
equation "\"d28\" = 0.5 * d26"
equation "\"d29\" = 0.5 * d26"
equation "\"d30\" = 0.5 * d27"
equation "\"d31\" = 0.5 * d27"
properties part number "front_motur_holder" material "Nylon 6/6"
